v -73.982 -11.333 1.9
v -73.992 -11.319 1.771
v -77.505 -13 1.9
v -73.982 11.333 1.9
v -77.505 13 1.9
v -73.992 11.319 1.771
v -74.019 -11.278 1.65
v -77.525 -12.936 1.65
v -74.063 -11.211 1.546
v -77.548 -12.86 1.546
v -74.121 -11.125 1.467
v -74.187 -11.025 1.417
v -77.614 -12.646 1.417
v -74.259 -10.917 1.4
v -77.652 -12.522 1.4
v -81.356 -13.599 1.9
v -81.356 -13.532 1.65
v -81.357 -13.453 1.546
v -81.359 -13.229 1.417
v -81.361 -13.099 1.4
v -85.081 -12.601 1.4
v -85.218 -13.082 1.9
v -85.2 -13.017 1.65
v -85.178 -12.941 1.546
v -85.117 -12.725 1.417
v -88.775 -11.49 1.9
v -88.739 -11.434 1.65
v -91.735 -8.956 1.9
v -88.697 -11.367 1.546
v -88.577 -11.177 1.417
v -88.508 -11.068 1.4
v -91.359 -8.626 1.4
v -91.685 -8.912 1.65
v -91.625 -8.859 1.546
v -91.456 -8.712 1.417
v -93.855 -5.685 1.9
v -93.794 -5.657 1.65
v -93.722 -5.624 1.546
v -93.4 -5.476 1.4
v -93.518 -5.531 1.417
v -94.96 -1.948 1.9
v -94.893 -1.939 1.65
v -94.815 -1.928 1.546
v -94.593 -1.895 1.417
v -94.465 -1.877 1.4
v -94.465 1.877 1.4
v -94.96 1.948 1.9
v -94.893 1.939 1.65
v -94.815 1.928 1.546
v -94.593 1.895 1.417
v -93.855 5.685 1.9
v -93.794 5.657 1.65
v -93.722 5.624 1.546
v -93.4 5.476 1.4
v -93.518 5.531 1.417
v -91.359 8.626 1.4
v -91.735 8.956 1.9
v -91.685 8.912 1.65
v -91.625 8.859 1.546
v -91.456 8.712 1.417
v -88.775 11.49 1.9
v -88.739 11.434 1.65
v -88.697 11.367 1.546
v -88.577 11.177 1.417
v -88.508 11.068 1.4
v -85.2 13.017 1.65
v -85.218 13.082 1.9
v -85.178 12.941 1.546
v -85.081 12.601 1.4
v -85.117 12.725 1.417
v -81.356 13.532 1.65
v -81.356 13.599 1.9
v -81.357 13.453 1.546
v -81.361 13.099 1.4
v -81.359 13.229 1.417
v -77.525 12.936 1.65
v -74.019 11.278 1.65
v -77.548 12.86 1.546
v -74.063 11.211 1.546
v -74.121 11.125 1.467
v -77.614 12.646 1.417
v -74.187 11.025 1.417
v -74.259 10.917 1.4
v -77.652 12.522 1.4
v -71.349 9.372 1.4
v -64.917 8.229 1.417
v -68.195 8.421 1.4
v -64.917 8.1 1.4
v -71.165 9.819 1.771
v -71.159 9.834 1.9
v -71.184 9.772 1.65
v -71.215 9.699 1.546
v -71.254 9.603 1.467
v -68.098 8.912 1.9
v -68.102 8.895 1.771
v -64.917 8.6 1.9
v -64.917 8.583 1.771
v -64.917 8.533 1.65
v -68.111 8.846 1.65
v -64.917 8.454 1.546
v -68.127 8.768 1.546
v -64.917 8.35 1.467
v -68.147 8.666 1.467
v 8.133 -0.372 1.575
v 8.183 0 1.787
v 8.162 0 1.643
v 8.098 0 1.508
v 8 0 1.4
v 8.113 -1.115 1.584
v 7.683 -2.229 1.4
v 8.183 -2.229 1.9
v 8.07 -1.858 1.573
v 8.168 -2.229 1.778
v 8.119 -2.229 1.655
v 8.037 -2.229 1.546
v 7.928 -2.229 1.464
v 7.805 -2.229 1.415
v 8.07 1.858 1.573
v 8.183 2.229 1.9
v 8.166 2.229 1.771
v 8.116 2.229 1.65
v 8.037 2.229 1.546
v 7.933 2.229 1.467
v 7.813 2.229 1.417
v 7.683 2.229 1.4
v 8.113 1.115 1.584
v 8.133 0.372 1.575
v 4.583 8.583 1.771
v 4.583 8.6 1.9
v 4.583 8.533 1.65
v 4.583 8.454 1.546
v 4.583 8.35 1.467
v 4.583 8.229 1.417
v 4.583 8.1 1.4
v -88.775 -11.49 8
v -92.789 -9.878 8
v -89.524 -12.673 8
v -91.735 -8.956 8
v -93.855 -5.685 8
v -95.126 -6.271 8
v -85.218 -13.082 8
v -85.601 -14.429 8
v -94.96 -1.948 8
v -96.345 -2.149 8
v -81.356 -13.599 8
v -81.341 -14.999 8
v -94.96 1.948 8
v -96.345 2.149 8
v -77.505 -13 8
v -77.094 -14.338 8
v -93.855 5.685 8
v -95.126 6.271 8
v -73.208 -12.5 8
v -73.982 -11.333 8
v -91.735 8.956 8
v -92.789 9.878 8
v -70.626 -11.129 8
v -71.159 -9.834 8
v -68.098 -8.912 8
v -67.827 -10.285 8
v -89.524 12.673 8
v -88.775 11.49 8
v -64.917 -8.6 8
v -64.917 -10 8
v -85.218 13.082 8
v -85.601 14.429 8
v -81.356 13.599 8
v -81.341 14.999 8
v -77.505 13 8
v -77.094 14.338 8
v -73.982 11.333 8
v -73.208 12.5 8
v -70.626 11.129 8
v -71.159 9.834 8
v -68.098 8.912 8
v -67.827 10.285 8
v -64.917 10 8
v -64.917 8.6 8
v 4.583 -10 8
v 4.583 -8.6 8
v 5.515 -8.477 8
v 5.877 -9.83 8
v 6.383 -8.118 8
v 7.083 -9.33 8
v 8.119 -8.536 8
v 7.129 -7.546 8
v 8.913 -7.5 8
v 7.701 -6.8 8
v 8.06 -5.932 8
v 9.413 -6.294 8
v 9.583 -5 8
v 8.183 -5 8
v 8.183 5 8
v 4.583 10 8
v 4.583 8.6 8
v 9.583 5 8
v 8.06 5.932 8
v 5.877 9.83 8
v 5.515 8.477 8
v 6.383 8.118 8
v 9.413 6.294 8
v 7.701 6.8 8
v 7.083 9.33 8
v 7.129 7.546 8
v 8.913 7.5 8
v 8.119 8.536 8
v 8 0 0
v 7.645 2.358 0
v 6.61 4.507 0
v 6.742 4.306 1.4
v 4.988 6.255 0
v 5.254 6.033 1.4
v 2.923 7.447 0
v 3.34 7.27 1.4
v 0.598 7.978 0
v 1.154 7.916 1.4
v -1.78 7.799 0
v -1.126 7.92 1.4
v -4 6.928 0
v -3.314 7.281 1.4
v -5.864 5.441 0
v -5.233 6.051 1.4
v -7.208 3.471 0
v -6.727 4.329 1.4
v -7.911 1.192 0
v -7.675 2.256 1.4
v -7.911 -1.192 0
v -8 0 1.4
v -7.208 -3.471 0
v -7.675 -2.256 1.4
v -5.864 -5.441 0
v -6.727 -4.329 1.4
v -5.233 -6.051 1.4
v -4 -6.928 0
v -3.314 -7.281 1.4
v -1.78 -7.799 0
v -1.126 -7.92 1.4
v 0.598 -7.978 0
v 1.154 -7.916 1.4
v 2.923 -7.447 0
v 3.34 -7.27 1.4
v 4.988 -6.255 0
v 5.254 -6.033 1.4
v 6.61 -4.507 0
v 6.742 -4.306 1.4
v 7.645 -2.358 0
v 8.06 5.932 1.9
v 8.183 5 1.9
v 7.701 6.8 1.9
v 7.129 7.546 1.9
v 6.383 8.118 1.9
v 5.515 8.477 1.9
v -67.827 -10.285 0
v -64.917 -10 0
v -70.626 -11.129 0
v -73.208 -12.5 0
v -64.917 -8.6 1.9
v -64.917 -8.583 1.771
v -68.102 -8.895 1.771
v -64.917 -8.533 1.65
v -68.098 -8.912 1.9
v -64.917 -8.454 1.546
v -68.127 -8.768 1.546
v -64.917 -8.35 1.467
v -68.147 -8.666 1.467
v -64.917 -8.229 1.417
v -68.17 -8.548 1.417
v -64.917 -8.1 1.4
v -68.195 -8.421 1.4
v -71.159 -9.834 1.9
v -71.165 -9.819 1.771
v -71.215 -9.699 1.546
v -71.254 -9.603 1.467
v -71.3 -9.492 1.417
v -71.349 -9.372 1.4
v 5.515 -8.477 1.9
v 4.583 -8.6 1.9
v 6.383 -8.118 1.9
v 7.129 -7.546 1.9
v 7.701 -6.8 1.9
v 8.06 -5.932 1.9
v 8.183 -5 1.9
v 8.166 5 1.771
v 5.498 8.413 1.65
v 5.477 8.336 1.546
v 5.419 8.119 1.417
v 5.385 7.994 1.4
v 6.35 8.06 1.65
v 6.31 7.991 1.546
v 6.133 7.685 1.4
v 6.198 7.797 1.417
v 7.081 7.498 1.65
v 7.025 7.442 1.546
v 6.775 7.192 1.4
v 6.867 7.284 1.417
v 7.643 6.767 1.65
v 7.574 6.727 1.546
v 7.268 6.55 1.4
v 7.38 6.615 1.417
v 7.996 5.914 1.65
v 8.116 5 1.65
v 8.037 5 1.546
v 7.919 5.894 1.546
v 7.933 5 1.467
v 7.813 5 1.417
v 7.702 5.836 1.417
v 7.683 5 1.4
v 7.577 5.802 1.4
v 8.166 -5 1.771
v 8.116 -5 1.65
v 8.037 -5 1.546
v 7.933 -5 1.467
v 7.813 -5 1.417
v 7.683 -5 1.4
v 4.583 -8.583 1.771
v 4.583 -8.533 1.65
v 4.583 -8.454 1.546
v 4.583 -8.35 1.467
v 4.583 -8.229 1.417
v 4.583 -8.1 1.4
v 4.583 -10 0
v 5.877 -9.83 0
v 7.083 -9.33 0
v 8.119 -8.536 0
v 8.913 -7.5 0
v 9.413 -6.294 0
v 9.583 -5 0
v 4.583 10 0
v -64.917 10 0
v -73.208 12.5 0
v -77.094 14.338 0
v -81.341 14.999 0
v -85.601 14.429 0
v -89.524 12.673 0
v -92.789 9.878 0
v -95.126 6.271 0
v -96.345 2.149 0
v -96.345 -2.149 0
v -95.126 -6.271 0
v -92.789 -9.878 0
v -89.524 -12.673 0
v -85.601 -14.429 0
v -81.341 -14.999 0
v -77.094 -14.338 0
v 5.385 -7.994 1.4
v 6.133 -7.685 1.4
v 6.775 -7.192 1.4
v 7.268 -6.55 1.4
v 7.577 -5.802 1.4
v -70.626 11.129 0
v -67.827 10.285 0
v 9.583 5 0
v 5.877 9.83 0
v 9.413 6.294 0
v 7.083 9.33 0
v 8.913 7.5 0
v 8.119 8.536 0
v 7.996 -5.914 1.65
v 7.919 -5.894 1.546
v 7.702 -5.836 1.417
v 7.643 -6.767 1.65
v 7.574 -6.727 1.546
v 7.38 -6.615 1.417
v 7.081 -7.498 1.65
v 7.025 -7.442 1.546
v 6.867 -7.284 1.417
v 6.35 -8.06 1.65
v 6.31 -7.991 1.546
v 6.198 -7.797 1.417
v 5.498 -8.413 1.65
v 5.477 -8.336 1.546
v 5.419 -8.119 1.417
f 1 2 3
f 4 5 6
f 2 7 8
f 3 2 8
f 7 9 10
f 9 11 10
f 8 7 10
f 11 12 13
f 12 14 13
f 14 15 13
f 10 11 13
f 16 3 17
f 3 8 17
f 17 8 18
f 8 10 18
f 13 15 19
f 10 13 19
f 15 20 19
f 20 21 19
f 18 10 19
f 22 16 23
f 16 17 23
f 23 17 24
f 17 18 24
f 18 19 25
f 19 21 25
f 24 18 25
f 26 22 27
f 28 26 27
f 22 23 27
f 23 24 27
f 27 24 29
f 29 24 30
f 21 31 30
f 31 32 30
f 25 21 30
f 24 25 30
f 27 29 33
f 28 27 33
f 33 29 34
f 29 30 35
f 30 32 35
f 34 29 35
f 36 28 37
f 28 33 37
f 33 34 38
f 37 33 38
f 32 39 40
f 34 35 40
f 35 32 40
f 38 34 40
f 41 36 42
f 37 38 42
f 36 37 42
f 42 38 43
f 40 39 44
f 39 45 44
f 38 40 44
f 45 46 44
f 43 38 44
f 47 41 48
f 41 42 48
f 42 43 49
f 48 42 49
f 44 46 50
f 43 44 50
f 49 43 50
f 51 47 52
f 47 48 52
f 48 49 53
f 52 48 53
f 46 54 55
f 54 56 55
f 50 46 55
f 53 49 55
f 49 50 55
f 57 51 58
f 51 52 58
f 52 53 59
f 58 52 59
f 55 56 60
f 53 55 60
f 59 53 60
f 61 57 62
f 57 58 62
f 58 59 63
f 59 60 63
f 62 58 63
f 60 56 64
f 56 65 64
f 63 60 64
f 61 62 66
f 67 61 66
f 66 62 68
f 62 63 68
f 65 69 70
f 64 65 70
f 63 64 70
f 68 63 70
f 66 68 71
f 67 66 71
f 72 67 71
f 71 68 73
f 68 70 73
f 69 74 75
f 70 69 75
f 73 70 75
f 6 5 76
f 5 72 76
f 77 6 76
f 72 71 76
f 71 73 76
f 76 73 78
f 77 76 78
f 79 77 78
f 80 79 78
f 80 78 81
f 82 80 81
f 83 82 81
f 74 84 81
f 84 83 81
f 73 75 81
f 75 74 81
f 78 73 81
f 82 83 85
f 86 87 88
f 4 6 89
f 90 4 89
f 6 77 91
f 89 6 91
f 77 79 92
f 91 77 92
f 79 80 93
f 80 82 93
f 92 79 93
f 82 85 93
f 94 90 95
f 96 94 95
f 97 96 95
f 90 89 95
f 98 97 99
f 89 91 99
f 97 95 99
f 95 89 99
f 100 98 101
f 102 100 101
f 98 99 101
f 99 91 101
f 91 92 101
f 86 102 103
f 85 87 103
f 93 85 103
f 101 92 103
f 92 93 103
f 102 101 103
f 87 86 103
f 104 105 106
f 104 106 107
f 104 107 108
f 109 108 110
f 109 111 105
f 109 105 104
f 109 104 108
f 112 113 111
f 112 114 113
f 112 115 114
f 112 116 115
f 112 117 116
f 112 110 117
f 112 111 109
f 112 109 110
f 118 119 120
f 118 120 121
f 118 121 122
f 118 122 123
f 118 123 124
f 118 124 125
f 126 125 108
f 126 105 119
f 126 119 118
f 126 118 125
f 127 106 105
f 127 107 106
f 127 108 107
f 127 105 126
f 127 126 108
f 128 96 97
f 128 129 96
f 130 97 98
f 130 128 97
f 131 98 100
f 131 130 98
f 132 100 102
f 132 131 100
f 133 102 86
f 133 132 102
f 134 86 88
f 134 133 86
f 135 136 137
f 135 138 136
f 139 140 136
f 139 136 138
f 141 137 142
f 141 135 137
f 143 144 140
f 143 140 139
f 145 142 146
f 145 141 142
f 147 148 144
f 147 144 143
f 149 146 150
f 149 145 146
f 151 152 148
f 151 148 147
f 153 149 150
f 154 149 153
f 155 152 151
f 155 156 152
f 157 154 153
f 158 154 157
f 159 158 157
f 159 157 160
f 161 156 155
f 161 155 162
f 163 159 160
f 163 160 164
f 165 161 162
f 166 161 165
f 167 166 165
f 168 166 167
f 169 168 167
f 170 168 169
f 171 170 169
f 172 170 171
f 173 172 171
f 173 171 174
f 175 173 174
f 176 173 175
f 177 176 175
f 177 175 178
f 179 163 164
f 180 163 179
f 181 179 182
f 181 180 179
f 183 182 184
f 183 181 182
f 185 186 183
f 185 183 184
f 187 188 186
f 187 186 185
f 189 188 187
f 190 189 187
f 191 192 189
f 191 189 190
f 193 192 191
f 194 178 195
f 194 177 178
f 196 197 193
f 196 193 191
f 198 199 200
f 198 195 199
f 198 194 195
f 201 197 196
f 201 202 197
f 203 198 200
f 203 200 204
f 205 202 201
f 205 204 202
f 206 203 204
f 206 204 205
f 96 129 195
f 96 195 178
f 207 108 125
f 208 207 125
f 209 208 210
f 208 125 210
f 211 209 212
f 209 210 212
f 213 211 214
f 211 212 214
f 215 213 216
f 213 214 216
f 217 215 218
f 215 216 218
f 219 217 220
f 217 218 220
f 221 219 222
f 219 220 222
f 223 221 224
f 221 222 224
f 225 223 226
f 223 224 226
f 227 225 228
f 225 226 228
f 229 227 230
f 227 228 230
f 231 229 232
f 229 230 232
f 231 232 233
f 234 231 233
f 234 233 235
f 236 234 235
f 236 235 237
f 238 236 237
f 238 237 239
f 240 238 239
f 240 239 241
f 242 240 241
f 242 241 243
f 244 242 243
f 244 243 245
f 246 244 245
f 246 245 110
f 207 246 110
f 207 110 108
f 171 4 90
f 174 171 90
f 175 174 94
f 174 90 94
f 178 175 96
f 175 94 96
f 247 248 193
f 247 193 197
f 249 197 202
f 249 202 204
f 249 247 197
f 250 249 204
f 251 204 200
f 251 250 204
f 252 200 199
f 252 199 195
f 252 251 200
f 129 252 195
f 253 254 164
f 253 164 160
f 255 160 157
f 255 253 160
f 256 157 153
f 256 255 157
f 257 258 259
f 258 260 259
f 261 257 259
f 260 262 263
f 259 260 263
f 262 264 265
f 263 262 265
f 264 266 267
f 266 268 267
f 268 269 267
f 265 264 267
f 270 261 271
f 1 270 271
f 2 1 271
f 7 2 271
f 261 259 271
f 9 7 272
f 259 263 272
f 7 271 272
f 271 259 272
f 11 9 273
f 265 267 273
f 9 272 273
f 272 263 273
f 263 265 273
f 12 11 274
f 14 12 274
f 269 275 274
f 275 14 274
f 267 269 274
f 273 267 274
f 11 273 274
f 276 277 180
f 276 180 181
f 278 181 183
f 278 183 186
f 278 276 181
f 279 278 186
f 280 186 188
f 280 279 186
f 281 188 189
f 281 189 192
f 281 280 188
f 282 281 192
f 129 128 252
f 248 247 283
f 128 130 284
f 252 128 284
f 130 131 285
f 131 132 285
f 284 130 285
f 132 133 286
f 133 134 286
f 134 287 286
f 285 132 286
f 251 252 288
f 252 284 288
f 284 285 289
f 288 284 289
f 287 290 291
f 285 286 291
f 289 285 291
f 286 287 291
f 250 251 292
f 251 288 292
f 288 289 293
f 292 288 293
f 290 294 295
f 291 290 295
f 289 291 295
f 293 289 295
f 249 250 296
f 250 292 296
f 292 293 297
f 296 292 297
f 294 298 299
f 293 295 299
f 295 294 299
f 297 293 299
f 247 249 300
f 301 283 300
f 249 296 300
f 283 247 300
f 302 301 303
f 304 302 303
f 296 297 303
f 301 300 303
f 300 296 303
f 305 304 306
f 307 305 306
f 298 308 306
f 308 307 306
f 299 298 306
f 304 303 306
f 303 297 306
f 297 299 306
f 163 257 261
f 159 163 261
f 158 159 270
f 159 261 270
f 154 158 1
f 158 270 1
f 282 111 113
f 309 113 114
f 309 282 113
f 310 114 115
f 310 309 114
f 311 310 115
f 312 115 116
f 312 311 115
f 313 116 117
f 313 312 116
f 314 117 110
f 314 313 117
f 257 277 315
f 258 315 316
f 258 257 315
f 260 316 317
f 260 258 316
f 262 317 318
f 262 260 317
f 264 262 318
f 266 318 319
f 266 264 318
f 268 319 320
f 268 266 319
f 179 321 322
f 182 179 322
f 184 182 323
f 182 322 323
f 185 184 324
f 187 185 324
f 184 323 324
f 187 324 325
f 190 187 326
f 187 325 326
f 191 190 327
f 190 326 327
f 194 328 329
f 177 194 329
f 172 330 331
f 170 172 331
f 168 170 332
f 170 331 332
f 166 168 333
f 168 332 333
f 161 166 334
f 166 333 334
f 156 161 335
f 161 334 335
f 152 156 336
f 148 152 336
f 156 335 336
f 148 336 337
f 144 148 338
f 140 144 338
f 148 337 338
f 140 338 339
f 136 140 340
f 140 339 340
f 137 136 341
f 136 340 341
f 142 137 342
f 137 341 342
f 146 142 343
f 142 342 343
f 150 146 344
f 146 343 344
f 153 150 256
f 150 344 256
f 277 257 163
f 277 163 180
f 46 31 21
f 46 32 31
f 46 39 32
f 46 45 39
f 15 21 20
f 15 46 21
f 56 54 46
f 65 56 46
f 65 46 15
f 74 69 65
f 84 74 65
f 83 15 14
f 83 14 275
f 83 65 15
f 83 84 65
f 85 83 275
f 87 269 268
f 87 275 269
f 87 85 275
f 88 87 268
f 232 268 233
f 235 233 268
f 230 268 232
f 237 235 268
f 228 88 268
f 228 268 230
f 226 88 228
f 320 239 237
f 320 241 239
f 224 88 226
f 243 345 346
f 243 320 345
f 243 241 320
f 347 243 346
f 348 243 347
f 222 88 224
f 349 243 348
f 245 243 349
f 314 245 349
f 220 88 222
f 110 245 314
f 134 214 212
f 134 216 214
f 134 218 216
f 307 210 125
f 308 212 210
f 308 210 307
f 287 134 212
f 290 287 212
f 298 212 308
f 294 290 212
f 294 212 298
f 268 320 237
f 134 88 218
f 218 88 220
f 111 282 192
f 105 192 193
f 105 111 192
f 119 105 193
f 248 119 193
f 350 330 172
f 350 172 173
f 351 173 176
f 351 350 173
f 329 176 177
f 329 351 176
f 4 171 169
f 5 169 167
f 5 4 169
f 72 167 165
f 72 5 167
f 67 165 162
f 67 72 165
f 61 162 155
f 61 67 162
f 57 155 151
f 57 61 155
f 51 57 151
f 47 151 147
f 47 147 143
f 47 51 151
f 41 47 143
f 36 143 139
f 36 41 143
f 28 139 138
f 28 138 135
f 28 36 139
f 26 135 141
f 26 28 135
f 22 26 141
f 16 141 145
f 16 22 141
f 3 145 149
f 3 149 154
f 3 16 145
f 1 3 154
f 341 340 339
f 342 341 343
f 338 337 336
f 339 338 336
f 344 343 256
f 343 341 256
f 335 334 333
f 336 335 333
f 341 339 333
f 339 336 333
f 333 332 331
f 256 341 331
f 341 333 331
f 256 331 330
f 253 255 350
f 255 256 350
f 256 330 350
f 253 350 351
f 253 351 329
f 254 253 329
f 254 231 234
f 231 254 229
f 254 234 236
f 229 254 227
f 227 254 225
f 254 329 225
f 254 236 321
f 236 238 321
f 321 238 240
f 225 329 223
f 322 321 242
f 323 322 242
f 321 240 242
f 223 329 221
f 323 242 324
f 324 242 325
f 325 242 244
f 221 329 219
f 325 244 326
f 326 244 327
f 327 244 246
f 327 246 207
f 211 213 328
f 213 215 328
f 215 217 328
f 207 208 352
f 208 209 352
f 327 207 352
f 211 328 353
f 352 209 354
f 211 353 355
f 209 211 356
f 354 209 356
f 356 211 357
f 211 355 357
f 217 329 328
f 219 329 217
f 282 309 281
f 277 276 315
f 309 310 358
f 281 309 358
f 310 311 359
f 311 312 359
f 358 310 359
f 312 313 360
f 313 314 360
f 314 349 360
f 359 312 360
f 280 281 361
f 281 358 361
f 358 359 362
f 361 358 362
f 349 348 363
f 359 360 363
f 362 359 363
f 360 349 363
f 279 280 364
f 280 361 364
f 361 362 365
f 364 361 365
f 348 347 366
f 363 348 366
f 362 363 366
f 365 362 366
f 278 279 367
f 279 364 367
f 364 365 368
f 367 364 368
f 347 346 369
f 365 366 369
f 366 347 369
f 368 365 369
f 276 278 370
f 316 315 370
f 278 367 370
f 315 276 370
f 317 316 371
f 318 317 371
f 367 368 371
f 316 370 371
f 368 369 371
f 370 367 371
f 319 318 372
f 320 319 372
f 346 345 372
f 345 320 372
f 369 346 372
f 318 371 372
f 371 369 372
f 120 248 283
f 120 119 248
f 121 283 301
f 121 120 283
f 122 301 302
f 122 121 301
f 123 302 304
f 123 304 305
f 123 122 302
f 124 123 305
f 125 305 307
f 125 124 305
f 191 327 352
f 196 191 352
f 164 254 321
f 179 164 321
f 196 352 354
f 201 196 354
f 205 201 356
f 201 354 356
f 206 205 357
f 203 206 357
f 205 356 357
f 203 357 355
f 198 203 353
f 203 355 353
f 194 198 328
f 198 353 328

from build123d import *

# Parameters (mm, degrees)
PAD_DEPTH    = 8
THICKNESS_T  = -1.4
SKETCH001_R  = 8
POCKET_DEPTH = 5
FILLET001_R  = 0.5


with BuildPart() as part:
    # Sketch → Pad (new body)
    with BuildSketch(Plane.XY):
        with BuildLine():
            Line((-64.916876, -10), (4.583124, -10))
            ThreePointArc((4.583124, -10), (8.118658, -8.535534), (9.583124, -5))
            Line((9.583124, -5), (9.583124, 5))
            ThreePointArc((9.583124, 5), (8.118658, 8.535534), (4.583124, 10))
            Line((4.583124, 10), (-64.916876, 10))
            ThreePointArc((-73.208438, 12.5), (-69.247003, 10.638593), (-64.916876, 10))
            ThreePointArc((-73.208438, 12.5), (-96.5, 0), (-73.208438, -12.5))
            ThreePointArc((-64.916876, -10), (-69.247003, -10.638593), (-73.208438, -12.5))
        make_face()
    extrude(amount=PAD_DEPTH)

    # Thickness
    thickness_openings = [part.faces().sort_by_distance(p)[0] for p in [
        (-45.837274, 0, 8),
    ]]
    offset(amount=THICKNESS_T, openings=thickness_openings)

    # Sketch001 (on Face19 of Thickness) → Pocket (cut)
    with BuildSketch(Plane.XY.offset(1.4)):
        Circle(SKETCH001_R)
    extrude(amount=-POCKET_DEPTH, mode=Mode.SUBTRACT)

    # Fillet001
    fillet001_edges = [part.edges().sort_by_distance(p)[0] for p in [
        (-95.1, 0, 1.4),
    ]]
    fillet(fillet001_edges, radius=FILLET001_R)


solid = part.part
